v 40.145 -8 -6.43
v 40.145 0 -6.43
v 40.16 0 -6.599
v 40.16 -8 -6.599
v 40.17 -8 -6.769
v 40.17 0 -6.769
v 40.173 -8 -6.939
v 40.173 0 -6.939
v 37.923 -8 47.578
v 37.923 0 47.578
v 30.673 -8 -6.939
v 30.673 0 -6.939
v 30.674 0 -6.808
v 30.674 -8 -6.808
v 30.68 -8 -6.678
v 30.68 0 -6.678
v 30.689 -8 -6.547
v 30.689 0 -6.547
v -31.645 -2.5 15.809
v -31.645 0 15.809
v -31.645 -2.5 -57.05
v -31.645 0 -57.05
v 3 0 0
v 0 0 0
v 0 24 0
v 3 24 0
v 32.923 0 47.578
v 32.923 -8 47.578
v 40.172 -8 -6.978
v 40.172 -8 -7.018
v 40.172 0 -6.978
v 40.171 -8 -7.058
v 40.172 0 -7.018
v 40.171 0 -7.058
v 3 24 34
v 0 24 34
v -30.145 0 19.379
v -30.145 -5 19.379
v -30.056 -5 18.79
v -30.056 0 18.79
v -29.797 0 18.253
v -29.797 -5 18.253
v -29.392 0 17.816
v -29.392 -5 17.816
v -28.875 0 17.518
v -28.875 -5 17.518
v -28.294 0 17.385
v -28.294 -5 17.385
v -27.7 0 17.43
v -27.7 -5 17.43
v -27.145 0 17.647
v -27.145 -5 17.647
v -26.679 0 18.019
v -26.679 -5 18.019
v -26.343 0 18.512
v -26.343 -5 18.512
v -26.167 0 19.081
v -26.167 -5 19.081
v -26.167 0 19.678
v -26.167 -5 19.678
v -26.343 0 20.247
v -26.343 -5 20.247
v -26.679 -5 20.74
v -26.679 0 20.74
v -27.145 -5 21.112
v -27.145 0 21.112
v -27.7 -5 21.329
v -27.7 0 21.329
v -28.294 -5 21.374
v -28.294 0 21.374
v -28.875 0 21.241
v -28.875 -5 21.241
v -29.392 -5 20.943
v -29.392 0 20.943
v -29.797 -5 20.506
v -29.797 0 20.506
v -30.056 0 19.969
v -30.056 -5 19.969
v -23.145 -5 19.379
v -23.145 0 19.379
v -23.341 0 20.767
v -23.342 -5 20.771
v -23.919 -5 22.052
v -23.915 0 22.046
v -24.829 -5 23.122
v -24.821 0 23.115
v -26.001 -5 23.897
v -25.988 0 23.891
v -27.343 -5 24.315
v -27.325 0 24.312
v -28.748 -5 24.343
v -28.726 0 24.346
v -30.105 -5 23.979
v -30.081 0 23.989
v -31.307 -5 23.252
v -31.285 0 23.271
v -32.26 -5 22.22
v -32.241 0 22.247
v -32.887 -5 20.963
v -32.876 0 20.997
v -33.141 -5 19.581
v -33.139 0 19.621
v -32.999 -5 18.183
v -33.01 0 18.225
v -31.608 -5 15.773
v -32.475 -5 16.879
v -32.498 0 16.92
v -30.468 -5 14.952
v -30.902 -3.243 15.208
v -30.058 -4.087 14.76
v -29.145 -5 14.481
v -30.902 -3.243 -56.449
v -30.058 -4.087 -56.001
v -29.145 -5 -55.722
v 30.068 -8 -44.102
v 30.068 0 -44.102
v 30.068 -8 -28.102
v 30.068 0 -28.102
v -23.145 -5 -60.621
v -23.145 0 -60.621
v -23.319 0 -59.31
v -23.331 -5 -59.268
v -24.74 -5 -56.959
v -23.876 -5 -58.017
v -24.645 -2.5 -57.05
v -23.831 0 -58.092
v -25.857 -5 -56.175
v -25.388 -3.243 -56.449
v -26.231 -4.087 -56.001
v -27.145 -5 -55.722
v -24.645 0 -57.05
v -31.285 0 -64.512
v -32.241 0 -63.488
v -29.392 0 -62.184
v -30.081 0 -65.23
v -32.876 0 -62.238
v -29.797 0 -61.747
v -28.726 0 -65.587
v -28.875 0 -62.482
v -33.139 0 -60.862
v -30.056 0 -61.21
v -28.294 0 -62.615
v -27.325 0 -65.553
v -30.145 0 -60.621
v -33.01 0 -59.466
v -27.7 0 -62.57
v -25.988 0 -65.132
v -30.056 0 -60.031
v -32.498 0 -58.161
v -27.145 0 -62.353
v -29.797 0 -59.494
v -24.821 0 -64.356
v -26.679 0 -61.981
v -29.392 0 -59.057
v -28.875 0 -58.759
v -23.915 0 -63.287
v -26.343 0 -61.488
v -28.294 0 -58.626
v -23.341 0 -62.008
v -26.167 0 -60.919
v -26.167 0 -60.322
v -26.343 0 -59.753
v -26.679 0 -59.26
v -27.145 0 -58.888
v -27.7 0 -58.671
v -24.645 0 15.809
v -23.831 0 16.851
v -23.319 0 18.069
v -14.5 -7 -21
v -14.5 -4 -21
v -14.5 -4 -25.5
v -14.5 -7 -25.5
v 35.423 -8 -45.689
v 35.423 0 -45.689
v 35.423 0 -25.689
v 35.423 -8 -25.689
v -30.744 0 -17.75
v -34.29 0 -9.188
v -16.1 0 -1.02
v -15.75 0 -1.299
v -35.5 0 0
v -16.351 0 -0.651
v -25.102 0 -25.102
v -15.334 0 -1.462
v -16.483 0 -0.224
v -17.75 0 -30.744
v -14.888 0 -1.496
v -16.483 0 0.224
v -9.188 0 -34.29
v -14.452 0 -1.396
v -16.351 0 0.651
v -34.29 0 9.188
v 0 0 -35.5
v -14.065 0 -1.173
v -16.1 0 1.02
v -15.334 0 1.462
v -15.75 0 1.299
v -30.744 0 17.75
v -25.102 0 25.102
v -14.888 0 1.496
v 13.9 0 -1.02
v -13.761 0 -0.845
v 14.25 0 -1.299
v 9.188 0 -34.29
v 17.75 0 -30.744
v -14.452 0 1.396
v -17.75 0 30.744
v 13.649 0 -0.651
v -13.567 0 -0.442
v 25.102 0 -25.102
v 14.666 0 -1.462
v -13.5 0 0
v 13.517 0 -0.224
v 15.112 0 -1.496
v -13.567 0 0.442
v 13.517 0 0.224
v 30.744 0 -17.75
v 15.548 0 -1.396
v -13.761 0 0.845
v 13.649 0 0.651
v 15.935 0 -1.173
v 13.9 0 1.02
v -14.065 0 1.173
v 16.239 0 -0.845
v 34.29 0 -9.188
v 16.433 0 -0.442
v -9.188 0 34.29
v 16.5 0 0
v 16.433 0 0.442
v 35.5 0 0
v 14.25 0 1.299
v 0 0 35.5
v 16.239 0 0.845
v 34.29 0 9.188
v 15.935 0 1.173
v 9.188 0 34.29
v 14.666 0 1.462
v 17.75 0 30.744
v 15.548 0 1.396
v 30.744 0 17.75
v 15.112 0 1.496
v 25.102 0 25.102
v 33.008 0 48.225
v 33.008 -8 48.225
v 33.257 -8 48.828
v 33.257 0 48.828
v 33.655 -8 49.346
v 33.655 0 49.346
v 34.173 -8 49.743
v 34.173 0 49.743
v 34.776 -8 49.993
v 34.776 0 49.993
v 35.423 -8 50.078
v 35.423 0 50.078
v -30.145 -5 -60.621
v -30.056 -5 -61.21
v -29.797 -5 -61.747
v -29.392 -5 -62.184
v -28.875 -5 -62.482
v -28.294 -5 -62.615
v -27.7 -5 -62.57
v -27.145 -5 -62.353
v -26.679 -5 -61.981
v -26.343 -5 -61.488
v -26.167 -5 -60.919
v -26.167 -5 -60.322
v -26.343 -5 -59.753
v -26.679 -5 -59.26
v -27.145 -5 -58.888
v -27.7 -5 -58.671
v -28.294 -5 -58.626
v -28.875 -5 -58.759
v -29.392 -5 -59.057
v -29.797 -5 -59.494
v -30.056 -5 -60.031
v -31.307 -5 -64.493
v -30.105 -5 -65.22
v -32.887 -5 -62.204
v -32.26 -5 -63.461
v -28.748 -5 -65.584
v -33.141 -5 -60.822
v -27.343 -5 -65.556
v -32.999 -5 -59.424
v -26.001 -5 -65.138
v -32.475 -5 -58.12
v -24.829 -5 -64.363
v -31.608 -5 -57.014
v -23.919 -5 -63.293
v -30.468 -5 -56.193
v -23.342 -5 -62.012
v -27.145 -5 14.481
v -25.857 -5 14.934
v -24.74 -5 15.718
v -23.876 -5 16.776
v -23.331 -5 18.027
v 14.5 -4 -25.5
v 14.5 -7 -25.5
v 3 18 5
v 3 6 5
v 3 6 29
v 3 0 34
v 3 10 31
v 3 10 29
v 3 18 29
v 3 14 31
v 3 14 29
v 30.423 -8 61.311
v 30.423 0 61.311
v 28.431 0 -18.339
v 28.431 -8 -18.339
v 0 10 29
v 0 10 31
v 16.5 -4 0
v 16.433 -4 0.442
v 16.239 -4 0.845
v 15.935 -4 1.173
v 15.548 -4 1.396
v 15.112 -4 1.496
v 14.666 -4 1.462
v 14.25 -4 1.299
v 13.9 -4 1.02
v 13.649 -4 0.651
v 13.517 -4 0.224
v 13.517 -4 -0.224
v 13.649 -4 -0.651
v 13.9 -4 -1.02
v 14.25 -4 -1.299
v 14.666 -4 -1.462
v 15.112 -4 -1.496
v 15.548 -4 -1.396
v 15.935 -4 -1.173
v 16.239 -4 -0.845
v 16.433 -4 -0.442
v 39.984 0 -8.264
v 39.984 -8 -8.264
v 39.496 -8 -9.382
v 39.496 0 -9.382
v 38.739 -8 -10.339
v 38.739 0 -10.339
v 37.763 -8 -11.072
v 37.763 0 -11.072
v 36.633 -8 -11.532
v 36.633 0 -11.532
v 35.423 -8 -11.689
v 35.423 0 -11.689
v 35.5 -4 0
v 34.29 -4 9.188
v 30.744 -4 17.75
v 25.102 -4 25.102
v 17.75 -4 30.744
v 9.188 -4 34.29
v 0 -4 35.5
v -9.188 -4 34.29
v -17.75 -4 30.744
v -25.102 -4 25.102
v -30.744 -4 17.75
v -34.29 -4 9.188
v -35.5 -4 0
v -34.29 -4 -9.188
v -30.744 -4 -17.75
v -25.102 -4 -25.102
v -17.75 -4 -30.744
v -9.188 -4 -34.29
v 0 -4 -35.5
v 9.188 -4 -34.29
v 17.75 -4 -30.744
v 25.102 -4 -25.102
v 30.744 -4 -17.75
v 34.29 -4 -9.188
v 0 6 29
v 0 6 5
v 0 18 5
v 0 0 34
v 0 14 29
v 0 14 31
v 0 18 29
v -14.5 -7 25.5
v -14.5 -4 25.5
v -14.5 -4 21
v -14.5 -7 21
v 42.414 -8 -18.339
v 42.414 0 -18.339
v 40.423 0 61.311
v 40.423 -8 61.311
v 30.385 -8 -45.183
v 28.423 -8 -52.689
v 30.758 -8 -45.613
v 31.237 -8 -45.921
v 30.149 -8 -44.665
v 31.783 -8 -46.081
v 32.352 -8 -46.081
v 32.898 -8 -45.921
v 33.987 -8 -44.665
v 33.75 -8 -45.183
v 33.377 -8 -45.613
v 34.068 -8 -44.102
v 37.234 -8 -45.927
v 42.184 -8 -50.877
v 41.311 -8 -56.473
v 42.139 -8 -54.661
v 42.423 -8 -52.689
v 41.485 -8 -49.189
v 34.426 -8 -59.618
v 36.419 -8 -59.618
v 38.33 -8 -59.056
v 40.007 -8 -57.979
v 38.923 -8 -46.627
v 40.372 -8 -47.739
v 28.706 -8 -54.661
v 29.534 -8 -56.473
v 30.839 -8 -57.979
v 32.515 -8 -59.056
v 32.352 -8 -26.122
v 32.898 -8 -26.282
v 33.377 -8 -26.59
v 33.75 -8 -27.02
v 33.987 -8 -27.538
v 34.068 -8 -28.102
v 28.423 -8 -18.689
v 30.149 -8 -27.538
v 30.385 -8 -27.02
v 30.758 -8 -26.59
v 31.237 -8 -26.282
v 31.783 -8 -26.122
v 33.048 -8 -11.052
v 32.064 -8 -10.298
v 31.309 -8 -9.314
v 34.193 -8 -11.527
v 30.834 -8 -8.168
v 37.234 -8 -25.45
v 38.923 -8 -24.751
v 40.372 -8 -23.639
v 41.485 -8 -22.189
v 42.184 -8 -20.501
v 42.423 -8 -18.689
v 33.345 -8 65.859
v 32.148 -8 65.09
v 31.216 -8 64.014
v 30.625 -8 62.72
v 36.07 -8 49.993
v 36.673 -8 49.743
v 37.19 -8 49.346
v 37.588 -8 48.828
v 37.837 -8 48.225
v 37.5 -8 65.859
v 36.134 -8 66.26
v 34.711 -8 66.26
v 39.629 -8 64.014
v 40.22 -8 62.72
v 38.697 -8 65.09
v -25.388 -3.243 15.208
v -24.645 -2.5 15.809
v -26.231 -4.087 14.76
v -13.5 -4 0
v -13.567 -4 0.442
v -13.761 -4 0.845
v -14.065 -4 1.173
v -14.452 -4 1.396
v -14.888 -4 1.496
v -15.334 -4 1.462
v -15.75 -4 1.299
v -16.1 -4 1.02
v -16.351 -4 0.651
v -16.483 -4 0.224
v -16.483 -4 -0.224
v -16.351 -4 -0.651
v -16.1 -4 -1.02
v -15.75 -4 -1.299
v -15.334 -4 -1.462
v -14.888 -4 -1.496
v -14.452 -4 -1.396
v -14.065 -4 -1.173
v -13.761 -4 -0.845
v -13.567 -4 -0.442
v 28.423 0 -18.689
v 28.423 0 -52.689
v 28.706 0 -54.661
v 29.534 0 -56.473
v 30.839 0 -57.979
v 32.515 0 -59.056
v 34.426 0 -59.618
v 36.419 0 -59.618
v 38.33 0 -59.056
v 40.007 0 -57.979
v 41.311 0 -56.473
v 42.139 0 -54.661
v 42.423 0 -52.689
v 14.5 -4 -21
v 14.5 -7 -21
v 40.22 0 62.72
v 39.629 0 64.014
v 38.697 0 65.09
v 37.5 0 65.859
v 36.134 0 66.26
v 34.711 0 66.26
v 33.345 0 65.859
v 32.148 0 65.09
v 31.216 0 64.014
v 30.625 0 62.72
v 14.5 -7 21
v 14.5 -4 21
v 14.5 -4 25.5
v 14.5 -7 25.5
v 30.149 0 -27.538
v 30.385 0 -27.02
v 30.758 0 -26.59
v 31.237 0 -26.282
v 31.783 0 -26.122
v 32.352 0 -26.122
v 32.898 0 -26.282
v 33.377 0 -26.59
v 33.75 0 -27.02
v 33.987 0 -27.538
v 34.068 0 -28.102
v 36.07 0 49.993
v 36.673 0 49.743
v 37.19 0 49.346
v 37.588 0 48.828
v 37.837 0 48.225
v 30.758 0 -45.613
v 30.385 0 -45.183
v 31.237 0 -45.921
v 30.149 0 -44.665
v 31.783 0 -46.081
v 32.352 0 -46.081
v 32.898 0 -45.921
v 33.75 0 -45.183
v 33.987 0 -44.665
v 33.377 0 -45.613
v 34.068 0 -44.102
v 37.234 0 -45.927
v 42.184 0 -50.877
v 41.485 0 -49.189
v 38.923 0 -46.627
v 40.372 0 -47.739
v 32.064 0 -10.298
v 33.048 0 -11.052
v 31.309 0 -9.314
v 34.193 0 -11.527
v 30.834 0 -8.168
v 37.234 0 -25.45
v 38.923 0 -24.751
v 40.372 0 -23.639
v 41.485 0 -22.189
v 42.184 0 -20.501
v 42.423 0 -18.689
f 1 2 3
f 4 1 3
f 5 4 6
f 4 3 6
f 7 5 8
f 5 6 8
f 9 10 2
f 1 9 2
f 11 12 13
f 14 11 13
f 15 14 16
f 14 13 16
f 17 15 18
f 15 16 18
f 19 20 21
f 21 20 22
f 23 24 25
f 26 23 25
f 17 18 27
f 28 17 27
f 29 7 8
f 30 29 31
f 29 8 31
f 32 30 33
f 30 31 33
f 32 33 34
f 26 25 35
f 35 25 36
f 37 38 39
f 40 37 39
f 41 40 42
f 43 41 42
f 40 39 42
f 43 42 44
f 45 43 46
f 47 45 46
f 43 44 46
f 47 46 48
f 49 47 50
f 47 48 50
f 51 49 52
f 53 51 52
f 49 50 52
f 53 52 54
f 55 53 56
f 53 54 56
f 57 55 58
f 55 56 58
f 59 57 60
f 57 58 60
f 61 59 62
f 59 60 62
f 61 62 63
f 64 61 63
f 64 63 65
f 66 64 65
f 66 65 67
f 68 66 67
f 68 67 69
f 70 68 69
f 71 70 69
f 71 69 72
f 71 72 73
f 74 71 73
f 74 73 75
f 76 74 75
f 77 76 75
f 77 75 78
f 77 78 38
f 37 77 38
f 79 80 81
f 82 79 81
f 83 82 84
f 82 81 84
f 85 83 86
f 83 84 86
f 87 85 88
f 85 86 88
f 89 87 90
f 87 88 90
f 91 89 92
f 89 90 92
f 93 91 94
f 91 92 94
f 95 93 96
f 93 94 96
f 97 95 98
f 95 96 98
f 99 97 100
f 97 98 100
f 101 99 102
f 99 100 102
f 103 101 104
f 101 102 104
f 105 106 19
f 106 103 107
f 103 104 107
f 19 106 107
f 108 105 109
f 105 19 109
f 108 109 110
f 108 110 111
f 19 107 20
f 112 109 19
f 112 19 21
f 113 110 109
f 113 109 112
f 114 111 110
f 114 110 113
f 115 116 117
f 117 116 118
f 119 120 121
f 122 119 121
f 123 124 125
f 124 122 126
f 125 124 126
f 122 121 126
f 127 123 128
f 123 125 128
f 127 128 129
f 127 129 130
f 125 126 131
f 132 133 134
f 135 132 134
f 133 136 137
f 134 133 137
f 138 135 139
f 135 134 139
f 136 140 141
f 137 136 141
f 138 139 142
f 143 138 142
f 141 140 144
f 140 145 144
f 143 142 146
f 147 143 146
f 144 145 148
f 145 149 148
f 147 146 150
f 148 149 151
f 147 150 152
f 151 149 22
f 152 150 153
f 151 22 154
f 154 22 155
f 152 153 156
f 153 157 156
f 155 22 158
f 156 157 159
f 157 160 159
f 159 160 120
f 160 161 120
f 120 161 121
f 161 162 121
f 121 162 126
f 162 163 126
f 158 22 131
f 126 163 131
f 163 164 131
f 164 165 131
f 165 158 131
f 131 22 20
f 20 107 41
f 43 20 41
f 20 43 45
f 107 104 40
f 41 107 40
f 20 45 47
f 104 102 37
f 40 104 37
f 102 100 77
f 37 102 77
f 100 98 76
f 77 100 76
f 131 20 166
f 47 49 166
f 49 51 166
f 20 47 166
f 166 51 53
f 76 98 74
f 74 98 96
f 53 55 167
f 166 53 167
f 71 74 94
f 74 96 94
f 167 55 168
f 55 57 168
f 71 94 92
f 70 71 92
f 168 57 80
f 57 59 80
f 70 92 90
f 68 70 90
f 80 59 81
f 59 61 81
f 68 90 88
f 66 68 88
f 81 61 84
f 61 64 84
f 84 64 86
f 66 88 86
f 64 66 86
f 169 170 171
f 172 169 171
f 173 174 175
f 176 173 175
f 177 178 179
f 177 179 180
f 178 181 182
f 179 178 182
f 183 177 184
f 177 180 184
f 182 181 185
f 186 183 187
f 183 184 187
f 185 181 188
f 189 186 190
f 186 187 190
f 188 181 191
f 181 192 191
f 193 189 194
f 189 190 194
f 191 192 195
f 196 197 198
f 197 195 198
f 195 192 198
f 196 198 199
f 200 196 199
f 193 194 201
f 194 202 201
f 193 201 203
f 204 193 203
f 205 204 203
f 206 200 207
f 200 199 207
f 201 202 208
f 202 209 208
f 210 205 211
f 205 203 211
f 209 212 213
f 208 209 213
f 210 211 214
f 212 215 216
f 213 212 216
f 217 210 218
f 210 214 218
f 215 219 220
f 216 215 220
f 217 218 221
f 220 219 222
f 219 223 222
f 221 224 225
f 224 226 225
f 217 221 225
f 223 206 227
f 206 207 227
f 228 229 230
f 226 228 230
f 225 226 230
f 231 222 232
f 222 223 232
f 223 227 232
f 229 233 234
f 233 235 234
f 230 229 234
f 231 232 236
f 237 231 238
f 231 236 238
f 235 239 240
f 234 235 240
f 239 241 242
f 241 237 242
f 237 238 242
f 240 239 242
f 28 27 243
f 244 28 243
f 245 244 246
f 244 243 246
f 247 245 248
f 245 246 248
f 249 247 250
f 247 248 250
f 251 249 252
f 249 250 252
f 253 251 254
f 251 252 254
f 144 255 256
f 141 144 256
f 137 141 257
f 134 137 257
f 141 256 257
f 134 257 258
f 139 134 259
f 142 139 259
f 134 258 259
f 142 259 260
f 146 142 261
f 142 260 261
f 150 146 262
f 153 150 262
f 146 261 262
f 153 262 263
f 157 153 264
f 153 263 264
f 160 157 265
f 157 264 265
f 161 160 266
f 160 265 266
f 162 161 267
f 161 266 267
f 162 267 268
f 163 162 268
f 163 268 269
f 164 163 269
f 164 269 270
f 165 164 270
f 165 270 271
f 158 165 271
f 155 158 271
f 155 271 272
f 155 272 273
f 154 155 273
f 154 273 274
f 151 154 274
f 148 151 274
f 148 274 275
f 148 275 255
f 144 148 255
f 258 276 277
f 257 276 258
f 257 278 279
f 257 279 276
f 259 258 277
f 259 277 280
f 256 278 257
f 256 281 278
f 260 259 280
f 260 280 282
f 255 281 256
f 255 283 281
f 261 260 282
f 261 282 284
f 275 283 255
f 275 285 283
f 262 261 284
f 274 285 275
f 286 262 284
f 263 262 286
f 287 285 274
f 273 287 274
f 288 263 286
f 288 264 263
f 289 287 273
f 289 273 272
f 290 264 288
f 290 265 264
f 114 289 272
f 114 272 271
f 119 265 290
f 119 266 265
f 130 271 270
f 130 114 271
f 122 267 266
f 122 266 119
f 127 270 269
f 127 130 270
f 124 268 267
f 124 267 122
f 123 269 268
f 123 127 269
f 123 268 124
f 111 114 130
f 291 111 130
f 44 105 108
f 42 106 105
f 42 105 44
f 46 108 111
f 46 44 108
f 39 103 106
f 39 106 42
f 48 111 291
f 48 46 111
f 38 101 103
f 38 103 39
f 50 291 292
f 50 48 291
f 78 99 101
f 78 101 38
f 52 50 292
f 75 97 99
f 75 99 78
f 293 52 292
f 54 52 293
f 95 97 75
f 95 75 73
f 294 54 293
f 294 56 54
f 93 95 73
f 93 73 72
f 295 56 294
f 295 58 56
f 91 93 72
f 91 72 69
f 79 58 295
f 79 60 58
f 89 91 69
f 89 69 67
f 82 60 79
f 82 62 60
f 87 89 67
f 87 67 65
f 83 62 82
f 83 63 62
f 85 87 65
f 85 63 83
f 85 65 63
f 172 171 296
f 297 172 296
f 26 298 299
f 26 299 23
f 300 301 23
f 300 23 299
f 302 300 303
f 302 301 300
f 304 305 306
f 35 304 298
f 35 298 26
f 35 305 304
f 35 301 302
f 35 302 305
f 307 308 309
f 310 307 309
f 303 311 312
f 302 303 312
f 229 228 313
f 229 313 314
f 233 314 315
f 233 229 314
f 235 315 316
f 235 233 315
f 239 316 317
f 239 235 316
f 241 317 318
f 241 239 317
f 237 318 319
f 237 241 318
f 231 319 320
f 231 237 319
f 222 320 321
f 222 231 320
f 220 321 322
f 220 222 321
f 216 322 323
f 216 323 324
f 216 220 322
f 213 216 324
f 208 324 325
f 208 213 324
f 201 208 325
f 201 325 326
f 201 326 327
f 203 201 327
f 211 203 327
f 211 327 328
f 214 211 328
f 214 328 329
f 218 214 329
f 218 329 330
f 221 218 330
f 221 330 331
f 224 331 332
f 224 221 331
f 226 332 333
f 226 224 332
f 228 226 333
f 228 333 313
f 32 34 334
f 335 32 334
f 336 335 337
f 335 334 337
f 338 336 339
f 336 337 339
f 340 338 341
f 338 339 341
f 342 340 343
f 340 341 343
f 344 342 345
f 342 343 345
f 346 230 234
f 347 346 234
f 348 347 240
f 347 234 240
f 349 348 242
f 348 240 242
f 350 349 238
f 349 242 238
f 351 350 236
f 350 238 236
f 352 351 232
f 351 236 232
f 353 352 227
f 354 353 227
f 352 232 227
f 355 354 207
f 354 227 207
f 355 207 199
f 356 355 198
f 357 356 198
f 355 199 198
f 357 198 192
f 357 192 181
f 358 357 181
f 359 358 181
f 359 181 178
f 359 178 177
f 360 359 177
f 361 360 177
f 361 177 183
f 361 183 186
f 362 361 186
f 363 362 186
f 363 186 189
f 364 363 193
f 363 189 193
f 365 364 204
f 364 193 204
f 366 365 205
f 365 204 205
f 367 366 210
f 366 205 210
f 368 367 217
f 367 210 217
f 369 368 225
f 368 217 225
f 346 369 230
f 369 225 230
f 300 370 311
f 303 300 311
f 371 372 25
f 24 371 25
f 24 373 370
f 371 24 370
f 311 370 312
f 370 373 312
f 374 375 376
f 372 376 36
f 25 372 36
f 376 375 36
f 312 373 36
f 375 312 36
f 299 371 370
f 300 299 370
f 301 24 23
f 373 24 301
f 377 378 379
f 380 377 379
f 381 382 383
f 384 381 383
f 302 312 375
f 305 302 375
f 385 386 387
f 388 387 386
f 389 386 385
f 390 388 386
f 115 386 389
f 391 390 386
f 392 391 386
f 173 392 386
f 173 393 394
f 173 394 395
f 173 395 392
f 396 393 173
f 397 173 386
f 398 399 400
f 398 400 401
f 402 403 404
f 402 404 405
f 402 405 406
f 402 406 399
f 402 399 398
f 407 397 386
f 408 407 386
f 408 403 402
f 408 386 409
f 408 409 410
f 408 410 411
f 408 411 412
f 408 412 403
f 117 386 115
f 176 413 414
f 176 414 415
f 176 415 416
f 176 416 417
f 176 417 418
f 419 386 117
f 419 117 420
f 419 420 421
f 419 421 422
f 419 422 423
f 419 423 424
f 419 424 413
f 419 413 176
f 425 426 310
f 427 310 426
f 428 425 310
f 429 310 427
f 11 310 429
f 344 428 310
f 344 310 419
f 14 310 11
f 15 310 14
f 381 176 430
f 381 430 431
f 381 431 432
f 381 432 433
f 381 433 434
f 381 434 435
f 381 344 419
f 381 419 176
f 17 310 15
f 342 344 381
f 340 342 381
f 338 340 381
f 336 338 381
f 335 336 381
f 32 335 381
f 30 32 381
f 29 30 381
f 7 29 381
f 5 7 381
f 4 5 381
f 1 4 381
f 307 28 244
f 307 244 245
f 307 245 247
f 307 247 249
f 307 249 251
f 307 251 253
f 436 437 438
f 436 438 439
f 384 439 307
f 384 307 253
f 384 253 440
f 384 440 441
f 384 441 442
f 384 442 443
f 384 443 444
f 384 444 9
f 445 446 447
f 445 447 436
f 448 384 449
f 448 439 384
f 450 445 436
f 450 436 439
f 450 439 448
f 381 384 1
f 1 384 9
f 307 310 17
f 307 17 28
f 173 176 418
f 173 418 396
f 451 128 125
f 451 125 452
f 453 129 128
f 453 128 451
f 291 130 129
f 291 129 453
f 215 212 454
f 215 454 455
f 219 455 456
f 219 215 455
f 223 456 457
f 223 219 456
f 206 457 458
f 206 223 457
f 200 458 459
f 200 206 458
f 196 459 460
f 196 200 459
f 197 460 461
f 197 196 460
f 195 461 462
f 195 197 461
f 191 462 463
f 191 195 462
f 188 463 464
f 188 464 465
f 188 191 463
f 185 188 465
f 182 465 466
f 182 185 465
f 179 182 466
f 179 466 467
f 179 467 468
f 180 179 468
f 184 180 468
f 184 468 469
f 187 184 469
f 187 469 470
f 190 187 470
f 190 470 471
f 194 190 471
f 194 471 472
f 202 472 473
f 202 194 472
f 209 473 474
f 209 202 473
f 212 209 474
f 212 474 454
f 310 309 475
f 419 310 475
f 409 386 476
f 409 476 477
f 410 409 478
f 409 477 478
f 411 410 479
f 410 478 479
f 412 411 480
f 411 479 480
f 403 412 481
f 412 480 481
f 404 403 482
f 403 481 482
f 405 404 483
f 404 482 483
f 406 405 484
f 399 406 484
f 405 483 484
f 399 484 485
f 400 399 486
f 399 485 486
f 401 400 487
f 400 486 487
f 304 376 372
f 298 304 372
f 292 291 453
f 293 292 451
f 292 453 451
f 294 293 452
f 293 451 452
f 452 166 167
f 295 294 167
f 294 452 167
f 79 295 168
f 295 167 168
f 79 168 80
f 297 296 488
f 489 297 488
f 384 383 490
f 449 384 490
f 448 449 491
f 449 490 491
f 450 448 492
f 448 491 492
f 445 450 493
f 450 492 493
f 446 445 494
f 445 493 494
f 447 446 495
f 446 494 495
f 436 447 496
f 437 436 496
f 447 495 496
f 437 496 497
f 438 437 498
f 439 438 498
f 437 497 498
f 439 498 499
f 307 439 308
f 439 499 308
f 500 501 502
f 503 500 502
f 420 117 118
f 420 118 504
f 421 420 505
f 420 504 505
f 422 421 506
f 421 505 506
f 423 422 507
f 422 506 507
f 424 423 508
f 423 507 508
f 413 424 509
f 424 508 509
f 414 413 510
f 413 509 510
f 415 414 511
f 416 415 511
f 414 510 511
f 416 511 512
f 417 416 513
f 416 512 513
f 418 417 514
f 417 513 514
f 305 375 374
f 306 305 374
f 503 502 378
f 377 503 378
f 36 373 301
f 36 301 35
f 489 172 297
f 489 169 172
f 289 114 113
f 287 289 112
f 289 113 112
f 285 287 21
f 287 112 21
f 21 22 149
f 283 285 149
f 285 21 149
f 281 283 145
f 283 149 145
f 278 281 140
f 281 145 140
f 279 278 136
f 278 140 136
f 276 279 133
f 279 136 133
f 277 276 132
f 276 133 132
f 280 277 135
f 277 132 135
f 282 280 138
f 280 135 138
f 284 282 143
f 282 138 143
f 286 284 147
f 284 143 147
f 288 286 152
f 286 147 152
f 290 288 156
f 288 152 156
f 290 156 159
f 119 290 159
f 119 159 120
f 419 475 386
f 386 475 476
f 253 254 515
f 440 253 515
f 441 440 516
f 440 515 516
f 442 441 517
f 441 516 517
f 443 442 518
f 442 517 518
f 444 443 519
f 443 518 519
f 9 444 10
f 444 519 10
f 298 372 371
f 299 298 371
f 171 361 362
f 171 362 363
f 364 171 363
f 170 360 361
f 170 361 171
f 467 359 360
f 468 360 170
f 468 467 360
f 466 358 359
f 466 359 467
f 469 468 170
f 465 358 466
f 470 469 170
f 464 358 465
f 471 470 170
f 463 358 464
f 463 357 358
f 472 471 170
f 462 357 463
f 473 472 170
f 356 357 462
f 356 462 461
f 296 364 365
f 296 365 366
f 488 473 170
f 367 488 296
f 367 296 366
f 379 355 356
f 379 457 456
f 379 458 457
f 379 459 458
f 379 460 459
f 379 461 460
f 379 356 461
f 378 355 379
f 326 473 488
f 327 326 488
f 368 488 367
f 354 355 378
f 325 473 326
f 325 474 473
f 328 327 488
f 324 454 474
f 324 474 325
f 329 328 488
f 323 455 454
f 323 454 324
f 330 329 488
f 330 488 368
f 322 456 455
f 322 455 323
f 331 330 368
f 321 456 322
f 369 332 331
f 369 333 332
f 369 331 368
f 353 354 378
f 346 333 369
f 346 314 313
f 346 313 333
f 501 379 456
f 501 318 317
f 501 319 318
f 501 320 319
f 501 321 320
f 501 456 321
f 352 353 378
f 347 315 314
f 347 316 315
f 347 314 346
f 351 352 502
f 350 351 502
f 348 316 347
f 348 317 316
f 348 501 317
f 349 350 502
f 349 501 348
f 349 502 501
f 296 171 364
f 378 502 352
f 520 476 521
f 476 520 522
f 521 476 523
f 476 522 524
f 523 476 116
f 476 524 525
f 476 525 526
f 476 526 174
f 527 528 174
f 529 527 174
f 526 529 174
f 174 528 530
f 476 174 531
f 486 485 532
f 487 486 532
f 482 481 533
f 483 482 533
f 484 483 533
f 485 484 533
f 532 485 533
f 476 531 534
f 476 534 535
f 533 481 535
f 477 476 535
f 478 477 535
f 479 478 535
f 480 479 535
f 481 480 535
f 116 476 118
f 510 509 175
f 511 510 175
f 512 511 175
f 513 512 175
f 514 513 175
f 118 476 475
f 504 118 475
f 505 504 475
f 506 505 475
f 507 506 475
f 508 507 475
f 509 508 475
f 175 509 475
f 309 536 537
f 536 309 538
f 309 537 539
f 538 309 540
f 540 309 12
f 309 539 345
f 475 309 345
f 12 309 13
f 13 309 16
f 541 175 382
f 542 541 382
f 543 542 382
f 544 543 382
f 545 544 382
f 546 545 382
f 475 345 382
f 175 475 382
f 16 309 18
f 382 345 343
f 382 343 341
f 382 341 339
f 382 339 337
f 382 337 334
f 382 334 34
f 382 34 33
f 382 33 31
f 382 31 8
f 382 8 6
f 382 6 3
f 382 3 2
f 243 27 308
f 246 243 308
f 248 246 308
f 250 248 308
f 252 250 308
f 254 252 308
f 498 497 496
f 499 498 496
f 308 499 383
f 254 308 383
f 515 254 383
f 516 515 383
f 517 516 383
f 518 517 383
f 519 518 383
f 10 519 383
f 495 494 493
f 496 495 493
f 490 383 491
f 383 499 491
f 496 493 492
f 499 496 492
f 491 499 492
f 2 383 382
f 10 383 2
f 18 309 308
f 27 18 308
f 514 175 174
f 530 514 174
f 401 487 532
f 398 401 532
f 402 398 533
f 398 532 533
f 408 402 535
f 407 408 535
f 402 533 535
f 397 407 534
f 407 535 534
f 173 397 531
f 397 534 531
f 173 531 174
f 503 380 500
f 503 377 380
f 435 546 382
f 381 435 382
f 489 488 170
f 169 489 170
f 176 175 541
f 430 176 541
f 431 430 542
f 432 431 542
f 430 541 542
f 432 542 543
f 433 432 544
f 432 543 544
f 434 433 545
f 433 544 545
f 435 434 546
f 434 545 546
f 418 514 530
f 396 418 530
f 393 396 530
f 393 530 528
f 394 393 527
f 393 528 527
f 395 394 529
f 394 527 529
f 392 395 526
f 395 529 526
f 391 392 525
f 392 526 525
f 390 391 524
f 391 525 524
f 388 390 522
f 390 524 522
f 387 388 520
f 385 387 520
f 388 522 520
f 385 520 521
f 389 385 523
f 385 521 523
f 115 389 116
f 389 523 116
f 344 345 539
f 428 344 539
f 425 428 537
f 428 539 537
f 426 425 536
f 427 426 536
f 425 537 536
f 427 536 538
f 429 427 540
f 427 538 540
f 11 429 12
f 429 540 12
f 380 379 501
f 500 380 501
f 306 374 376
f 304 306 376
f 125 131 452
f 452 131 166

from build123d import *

# Parameters (mm, degrees)
F0_R           = 35.5
F0_R_2         = 1.5
F1_DEPTH       = 4
F2_DEPTH       = 7
F5_DEPTH       = 5
F6_SIZE        = 2.5
F7_D           = 4
F7_DEPTH       = 6
F7_CBORE_D     = 6
F7_CBORE_DEPTH = 0
F7_TIP         = 1.2017212381
F3_W           = 24
F3_H           = 34
F8_DEPTH       = 3
F10_DEPTH      = 8


with BuildPart() as f1:
    # F0 (on Front) → F1 (new body)
    with BuildSketch(Plane.XZ):
        Circle(F0_R)
        Polygon((14.5, -21), (14.5, -25.5), (-14.5, -25.5), (-14.5, -21), (0, -21), align=None, mode=Mode.SUBTRACT)
        with Locations((-15, 0)):
            Circle(F0_R_2, mode=Mode.SUBTRACT)
        with Locations((15, 0)):
            Circle(F0_R_2, mode=Mode.SUBTRACT)
        Polygon((14.5, 21), (0, 21), (-14.5, 21), (-14.5, 25.5), (14.5, 25.5), align=None, mode=Mode.SUBTRACT)
    extrude(amount=F1_DEPTH)

    # F0 (on Front) → F2 (join)
    with BuildSketch(Plane.XZ):
        Polygon((-14.5, -25.5), (14.5, -25.5), (14.5, -21), (0, -21), (-14.5, -21), align=None)
        Polygon((-14.5, 21), (0, 21), (14.5, 21), (14.5, 25.5), (-14.5, 25.5), align=None)
    extrude(amount=F2_DEPTH)


with BuildPart() as f5:
    # F4 (on Front) → F5 (new body)
    with BuildSketch(Plane.XZ):
        with BuildLine():
            ThreePointArc((-24.6447846293, -57.0497911485), (-28.1447846293, -55.6205053627), (-31.6447846293, -57.0497911485))
            Line((-31.6447846293, -57.0497911485), (-31.6447846293, -60.6205053627))
            Line((-31.6447846293, -60.6205053627), (-28.1447846293, -60.6205053627))
            Line((-28.1447846293, -60.6205053627), (-24.6447846293, -60.6205053627))
            Line((-24.6447846293, -60.6205053627), (-24.6447846293, -57.0497911485))
        make_face()
        with BuildLine():
            ThreePointArc((-24.6447846293, 15.808780423), (-28.1447846293, 14.3794946373), (-31.6447846293, 15.808780423))
            Line((-31.6447846293, 15.808780423), (-31.6447846293, -57.0497911485))
            ThreePointArc((-31.6447846293, -57.0497911485), (-28.1447846293, -55.6205053627), (-24.6447846293, -57.0497911485))
            Line((-24.6447846293, -57.0497911485), (-24.6447846293, 15.808780423))
        make_face()
        with BuildLine():
            Line((-31.6447846293, 15.808780423), (-31.6447846293, 19.3794946373))
            Line((-31.6447846293, 19.3794946373), (-28.1447846293, 19.3794946373))
            Line((-28.1447846293, 19.3794946373), (-24.6447846293, 19.3794946373))
            Line((-24.6447846293, 19.3794946373), (-24.6447846293, 15.808780423))
            ThreePointArc((-24.6447846293, 15.808780423), (-23.5350124007, 17.4430029641), (-23.1447846293, 19.3794946373))
            ThreePointArc((-23.1447846293, 19.3794946373), (-30.0812763024, 23.9892668659), (-31.6447846293, 15.808780423))
        make_face()
        with BuildLine():
            Line((-28.1447846293, 19.3794946373), (-31.6447846293, 19.3794946373))
            Line((-31.6447846293, 19.3794946373), (-31.6447846293, 15.808780423))
            ThreePointArc((-31.6447846293, 15.808780423), (-28.1447846293, 14.3794946373), (-24.6447846293, 15.808780423))
            Line((-24.6447846293, 15.808780423), (-24.6447846293, 19.3794946373))
            Line((-24.6447846293, 19.3794946373), (-28.1447846293, 19.3794946373))
        make_face()
        with BuildLine():
            Line((-31.6447846293, -60.6205053627), (-31.6447846293, -57.0497911485))
            ThreePointArc((-31.6447846293, -57.0497911485), (-30.0812763024, -65.2302775914), (-23.1447846293, -60.6205053627))
            ThreePointArc((-23.1447846293, -60.6205053627), (-23.5350124007, -58.6840136896), (-24.6447846293, -57.0497911485))
            Line((-24.6447846293, -57.0497911485), (-24.6447846293, -60.6205053627))
            Line((-24.6447846293, -60.6205053627), (-28.1447846293, -60.6205053627))
            Line((-28.1447846293, -60.6205053627), (-31.6447846293, -60.6205053627))
        make_face()
    extrude(amount=F5_DEPTH)

    # F6
    f6_edges = [f5.edges().sort_by_distance(p)[0] for p in [
        (-31.644785, -5, -20.620505),
        (-24.644785, -5, -20.620505),
    ]]
    chamfer(f6_edges, length=F6_SIZE)

    # F7
    with Locations(Plane(origin=(0, 0, 0), x_dir=(1, 0, 0), z_dir=(0, 1, 0))):
        with Locations((-28.1447846293, -19.3794946373), (-28.1447846293, 60.6205053627)):
            CounterBoreHole(F7_D / 2, F7_CBORE_D / 2, F7_CBORE_DEPTH, depth=F7_DEPTH)
            with Locations((0, 0, -(F7_DEPTH + F7_TIP / 2))):  # 118° drill point
                Cone(0, F7_D / 2, F7_TIP, mode=Mode.SUBTRACT)


with BuildPart() as f8:
    # F3 (on Right) → F8 (new body)
    with BuildSketch(Plane.YZ):
        with Locations((12, 17)):
            Rectangle(F3_W, F3_H)
        Polygon((6, 5), (6, 29), (10, 29), (10, 31), (14, 31), (14, 29), (18, 29), (18, 5), align=None, mode=Mode.SUBTRACT)
    extrude(amount=F8_DEPTH)


with BuildPart() as f10:
    # F9 (on Front) → F10 (new body)
    with BuildSketch(Plane.XZ):
        with BuildLine():
            Line((35.4225598276, 52.5783236325), (35.4225598276, 56.3111443222))
            ThreePointArc((35.4225598276, 56.3111443222), (31.8870259216, 57.7756104162), (30.4225598276, 61.3111443222))
            Line((30.4225598276, 61.3111443222), (28.4313043622, -18.3390742912))
            ThreePointArc((28.4313043622, -18.3390742912), (30.5980634656, -13.616949246), (35.4225598276, -11.6888556778))
            ThreePointArc((35.4225598276, -11.6888556778), (32.0638026169, -10.2976128885), (30.6725598276, -6.9388556778))
            ThreePointArc((30.6725598276, -6.9388556778), (30.6766000709, -6.7429833017), (30.6887139277, -6.5474441348))
            Line((30.6887139277, -6.5474441348), (32.9225598276, 47.5783236325))
            ThreePointArc((32.9225598276, 47.5783236325), (33.6547928746, 49.3460905854), (35.4225598276, 50.0783236325))
            Line((35.4225598276, 50.0783236325), (35.4225598276, 52.5783236325))
        make_face()
        with BuildLine():
            Line((30.4225598276, 61.3111443222), (35.4225598276, 61.3111443222))
            Line((35.4225598276, 61.3111443222), (40.4225598276, 61.3111443222))
            ThreePointArc((40.4225598276, 61.3111443222), (35.4225598276, 66.3111443222), (30.4225598276, 61.3111443222))
        make_face()
        with BuildLine():
            Line((35.4225598276, 56.3111443222), (35.4225598276, 61.3111443222))
            Line((35.4225598276, 61.3111443222), (30.4225598276, 61.3111443222))
            ThreePointArc((30.4225598276, 61.3111443222), (31.8870259216, 57.7756104162), (35.4225598276, 56.3111443222))
        make_face()
        with BuildLine():
            Line((40.4225598276, 61.3111443222), (35.4225598276, 61.3111443222))
            Line((35.4225598276, 61.3111443222), (35.4225598276, 56.3111443222))
            ThreePointArc((35.4225598276, 56.3111443222), (38.9580937335, 57.7756104162), (40.4225598276, 61.3111443222))
        make_face()
        with BuildLine():
            ThreePointArc((40.4225598276, 61.3111443222), (38.9580937335, 57.7756104162), (35.4225598276, 56.3111443222))
            Line((35.4225598276, 56.3111443222), (35.4225598276, 52.5783236325))
            Line((35.4225598276, 52.5783236325), (35.4225598276, 50.0783236325))
            ThreePointArc((35.4225598276, 50.0783236325), (37.1903267805, 49.3460905854), (37.9225598276, 47.5783236325))
            Line((37.9225598276, 47.5783236325), (40.1452636043, -6.4303588366))
            ThreePointArc((40.1452636043, -6.4303588366), (40.1657308628, -6.6842412039), (40.1725598276, -6.9388556778))
            ThreePointArc((40.1725598276, -6.9388556778), (40.1721888932, -6.9982167674), (40.171076148, -7.0575685859))
            ThreePointArc((40.171076148, -7.0575685859), (38.739080119, -10.3393252273), (35.4225598276, -11.6888556778))
            ThreePointArc((35.4225598276, -11.6888556778), (40.2470561895, -13.616949246), (42.4138152929, -18.3390742912))
            Line((42.4138152929, -18.3390742912), (40.4225598276, 61.3111443222))
        make_face()
        with BuildLine():
            ThreePointArc((35.4225598276, -11.6888556778), (30.5980634656, -13.616949246), (28.4313043622, -18.3390742912))
            Line((28.4313043622, -18.3390742912), (28.4225598276, -18.6888556778))
            Line((28.4225598276, -18.6888556778), (35.4225598276, -18.6888556778))
            Line((35.4225598276, -18.6888556778), (35.4225598276, -11.6888556778))
        make_face()
        with BuildLine():
            Line((42.4225598276, -18.6888556778), (42.4138152929, -18.3390742912))
            ThreePointArc((42.4138152929, -18.3390742912), (40.2470561895, -13.616949246), (35.4225598276, -11.6888556778))
            Line((35.4225598276, -11.6888556778), (35.4225598276, -18.6888556778))
            Line((35.4225598276, -18.6888556778), (42.4225598276, -18.6888556778))
        make_face()
        with BuildLine():
            ThreePointArc((35.4225598276, -25.6888556778), (40.3723072959, -23.6386031461), (42.4225598276, -18.6888556778))
            Line((42.4225598276, -18.6888556778), (35.4225598276, -18.6888556778))
            Line((35.4225598276, -18.6888556778), (35.4225598276, -25.6888556778))
        make_face()
        with BuildLine():
            Line((35.4225598276, -18.6888556778), (28.4225598276, -18.6888556778))
            ThreePointArc((28.4225598276, -18.6888556778), (30.4728123593, -23.6386031461), (35.4225598276, -25.6888556778))
            Line((35.4225598276, -25.6888556778), (35.4225598276, -18.6888556778))
        make_face()
        with BuildLine():
            ThreePointArc((35.4225598276, -25.6888556778), (30.4728123593, -23.6386031461), (28.4225598276, -18.6888556778))
            Line((28.4225598276, -18.6888556778), (28.4225598276, -52.6888556778))
            ThreePointArc((28.4225598276, -52.6888556778), (30.4728123593, -47.7391082095), (35.4225598276, -45.6888556778))
            Line((35.4225598276, -45.6888556778), (35.4225598276, -43.6571886837))
            Line((35.4225598276, -43.6571886837), (35.4225598276, -26.6888556778))
            Line((35.4225598276, -26.6888556778), (35.4225598276, -25.6888556778))
        make_face()
        with BuildLine():
            Line((34.0675652474, -28.1017411649), (34.0675652474, -44.1017411649))
            ThreePointArc((34.0675652474, -44.1017411649), (32.0675652474, -46.1017411649), (30.0675652474, -44.1017411649))
            Line((30.0675652474, -44.1017411649), (30.0675652474, -28.1017411649))
            ThreePointArc((30.0675652474, -28.1017411649), (32.0675652474, -26.1017411649), (34.0675652474, -28.1017411649))
        make_face(mode=Mode.SUBTRACT)
        with BuildLine():
            ThreePointArc((35.4225598276, -45.6888556778), (30.4728123593, -47.7391082095), (28.4225598276, -52.6888556778))
            Line((28.4225598276, -52.6888556778), (35.4225598276, -52.6888556778))
            Line((35.4225598276, -52.6888556778), (35.4225598276, -45.6888556778))
        make_face()
        with BuildLine():
            Line((35.4225598276, -52.6888556778), (42.4225598276, -52.6888556778))
            ThreePointArc((42.4225598276, -52.6888556778), (40.3723072959, -47.7391082095), (35.4225598276, -45.6888556778))
            Line((35.4225598276, -45.6888556778), (35.4225598276, -52.6888556778))
        make_face()
        with BuildLine():
            Line((35.4225598276, -52.6888556778), (28.4225598276, -52.6888556778))
            ThreePointArc((28.4225598276, -52.6888556778), (35.4225598276, -59.6888556778), (42.4225598276, -52.6888556778))
            Line((42.4225598276, -52.6888556778), (35.4225598276, -52.6888556778))
        make_face()
    extrude(amount=F10_DEPTH)


solid = Compound([f1.part, f5.part, f8.part, f10.part])
